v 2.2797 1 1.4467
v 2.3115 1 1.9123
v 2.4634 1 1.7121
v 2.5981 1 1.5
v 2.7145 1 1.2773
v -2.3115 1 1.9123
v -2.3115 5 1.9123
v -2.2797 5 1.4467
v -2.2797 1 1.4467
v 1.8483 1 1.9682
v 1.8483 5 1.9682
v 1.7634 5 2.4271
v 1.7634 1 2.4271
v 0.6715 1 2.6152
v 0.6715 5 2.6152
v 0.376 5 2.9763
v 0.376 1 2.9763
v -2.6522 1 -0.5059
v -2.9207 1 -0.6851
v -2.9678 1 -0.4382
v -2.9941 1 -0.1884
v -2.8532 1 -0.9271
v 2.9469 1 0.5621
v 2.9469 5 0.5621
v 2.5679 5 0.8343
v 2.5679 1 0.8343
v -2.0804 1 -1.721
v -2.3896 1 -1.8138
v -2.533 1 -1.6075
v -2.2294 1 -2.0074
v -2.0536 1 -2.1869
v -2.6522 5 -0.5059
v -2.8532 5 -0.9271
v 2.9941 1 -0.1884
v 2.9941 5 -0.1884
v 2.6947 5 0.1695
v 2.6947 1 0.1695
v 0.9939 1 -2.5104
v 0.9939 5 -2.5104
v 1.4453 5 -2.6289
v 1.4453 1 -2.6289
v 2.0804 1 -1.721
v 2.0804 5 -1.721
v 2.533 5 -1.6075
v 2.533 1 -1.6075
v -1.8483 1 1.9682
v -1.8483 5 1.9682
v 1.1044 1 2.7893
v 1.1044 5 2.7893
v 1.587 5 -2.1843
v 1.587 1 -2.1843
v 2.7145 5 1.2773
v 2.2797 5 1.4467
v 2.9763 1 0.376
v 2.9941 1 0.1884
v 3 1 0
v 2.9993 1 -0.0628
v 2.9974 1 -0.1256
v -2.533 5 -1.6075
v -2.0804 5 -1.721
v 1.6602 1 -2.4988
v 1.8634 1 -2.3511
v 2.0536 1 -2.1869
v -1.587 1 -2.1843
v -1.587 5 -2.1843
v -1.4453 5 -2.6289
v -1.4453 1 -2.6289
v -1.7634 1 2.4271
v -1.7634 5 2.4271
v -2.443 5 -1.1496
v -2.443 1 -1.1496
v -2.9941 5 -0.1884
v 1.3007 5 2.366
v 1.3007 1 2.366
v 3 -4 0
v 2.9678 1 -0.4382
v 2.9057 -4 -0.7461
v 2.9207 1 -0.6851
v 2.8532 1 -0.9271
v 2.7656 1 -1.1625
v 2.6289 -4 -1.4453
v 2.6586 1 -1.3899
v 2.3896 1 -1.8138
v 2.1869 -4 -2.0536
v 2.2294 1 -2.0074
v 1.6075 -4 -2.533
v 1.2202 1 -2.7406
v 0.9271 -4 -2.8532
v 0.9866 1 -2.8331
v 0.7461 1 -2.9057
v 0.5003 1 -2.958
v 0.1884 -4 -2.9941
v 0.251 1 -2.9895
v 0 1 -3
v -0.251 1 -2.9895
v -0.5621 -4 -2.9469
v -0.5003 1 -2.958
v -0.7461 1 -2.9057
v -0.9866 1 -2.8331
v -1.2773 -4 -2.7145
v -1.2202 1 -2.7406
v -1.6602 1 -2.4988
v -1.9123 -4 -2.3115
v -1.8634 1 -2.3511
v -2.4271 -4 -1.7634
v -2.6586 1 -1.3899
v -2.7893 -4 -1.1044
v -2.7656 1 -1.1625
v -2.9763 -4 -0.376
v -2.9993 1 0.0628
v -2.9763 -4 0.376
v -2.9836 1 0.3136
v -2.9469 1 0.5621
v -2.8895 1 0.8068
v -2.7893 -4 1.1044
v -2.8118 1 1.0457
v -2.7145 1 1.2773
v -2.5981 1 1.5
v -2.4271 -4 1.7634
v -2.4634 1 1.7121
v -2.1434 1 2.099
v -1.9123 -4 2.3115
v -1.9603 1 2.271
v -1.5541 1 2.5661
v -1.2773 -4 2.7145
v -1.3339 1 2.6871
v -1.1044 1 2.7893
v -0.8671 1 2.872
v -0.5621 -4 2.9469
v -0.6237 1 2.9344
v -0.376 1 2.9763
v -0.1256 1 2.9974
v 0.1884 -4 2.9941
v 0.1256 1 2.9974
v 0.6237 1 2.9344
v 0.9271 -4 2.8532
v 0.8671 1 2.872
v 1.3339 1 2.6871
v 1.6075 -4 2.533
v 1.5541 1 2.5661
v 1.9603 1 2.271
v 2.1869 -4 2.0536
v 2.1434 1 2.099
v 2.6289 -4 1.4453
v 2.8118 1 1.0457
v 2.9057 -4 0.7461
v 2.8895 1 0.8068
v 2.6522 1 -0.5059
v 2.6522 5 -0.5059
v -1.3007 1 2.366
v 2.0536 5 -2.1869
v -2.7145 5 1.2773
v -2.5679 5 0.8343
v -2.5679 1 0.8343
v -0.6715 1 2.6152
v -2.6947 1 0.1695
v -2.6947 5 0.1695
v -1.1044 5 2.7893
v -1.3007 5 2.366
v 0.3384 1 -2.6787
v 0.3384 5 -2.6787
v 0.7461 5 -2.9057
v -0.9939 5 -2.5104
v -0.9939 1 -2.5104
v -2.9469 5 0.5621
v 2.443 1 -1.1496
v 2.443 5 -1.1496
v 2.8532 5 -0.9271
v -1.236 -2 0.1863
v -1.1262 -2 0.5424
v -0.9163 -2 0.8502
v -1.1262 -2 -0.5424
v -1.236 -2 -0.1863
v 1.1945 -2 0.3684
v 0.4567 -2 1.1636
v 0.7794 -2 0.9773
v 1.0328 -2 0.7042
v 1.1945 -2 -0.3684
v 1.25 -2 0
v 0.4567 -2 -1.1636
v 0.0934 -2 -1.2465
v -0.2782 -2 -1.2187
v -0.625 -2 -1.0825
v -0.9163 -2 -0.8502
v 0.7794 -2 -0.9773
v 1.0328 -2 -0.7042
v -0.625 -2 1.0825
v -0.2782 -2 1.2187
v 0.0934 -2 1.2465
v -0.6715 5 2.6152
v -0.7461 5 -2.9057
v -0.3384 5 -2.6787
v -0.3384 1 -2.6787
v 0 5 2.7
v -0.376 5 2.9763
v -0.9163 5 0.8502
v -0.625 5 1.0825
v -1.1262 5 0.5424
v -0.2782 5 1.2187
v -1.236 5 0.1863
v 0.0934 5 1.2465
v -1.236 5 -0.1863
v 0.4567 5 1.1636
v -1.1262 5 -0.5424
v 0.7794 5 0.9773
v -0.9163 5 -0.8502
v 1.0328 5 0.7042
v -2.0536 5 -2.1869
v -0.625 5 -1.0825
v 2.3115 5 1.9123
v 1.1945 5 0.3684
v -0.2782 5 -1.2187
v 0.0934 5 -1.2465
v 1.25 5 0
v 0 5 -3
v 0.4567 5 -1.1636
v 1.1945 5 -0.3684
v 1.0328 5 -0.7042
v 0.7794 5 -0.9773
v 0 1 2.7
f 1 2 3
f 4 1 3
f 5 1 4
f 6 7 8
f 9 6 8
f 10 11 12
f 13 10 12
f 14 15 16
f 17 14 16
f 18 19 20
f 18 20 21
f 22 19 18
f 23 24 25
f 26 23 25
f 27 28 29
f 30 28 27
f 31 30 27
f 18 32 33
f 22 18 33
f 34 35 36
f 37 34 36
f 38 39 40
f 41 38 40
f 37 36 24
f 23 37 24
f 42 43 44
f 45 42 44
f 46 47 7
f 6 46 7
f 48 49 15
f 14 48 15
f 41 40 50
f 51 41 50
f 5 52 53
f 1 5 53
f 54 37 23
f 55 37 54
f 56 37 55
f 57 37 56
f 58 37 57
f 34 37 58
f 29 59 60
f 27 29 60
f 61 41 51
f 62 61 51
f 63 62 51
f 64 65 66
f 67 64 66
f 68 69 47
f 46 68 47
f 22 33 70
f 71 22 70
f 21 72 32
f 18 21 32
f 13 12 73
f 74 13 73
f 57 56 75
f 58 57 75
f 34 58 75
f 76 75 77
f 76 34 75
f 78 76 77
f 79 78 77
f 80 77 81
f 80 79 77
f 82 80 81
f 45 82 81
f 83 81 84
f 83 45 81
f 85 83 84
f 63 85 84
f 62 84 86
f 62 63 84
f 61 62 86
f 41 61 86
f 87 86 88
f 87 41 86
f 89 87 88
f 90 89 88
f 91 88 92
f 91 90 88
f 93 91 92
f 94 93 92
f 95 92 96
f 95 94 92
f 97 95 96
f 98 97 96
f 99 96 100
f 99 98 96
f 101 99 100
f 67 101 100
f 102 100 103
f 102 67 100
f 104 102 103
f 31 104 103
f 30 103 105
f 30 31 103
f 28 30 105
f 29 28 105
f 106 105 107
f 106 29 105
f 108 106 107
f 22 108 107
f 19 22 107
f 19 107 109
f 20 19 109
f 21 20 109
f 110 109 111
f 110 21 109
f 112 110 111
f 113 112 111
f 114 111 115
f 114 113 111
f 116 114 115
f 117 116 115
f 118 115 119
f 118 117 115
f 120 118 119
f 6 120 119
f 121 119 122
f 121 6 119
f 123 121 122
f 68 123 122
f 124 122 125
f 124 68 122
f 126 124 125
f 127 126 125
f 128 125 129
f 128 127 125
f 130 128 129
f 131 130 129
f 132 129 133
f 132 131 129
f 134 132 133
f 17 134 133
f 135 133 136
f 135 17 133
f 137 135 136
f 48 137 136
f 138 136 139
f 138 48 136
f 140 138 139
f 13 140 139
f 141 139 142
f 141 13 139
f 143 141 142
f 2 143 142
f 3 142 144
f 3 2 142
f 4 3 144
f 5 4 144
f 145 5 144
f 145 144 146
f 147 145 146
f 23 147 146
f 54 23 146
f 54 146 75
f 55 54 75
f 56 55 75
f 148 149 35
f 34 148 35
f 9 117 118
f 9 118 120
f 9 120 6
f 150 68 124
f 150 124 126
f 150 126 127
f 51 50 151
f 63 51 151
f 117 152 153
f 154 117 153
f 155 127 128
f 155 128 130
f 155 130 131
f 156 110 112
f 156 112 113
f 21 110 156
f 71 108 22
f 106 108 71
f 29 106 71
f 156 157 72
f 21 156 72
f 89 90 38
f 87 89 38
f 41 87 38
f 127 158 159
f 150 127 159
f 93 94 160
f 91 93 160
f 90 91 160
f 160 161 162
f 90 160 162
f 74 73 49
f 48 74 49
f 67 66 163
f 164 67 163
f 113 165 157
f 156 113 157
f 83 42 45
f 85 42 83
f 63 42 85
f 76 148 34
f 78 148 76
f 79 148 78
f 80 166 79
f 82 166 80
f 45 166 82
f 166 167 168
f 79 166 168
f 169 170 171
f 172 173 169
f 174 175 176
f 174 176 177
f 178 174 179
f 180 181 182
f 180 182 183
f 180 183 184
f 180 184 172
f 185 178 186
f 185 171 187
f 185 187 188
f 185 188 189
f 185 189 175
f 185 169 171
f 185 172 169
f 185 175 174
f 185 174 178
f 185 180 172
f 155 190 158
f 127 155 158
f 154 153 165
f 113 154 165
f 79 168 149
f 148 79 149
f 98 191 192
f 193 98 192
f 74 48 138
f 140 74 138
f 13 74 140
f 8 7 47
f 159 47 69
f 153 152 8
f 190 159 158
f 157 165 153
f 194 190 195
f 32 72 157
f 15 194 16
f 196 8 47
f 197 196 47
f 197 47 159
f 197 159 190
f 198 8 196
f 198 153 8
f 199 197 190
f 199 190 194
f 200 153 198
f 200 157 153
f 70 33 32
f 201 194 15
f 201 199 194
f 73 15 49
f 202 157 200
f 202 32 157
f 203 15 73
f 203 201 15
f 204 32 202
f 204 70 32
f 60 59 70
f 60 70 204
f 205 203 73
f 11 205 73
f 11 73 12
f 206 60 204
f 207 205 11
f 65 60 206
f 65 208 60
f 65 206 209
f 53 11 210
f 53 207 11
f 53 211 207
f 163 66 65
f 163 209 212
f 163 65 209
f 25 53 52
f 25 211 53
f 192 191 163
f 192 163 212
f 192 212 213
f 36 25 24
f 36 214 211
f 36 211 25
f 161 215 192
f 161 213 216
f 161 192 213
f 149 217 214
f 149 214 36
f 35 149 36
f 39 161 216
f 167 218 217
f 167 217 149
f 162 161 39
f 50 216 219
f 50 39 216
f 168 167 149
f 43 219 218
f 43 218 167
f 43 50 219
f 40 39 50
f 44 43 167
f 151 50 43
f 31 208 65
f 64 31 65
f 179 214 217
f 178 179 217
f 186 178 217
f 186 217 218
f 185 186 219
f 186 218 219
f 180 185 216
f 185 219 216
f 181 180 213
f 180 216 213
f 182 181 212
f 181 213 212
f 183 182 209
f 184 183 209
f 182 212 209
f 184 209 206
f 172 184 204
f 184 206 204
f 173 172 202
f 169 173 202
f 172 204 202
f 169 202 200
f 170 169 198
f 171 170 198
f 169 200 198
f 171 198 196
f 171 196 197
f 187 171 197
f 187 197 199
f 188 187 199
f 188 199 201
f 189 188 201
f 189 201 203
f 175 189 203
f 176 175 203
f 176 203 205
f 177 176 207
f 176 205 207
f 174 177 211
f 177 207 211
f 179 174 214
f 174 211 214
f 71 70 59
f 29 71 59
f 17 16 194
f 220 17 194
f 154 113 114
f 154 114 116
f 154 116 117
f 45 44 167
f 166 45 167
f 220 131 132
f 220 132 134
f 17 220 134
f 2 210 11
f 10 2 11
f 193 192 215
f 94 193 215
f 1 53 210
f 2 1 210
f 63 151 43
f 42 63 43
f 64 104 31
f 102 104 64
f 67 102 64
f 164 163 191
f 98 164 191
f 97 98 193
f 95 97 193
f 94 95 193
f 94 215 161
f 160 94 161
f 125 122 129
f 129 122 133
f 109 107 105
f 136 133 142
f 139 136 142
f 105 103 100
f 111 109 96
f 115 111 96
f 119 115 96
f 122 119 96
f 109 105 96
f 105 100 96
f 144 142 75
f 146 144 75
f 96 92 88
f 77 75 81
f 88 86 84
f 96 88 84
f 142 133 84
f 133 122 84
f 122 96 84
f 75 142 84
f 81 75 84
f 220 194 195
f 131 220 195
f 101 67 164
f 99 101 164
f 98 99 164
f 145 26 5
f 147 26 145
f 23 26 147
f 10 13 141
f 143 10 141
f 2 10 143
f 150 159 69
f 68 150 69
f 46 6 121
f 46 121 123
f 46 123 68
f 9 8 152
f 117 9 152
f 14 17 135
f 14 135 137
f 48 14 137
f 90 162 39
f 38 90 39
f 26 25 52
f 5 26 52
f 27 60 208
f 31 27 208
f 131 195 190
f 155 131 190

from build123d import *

# Parameters (mm, degrees)
SKETCH_1_R           = 3
EXTRUDE_1_DEPTH      = 5
EXTRUDE_1_DEPTH_BACK = 4
SKETCH_2_OUTSIDE_W   = 10.474
SKETCH_2_OUTSIDE_H   = 10.474
CUT_EXTRUDE_1_DEPTH  = 4
SKETCH_3_R           = 1.25
CUT_EXTRUDE_2_DEPTH  = 7


with BuildPart() as part:
    # Эскиз1 → Бобышка-Вытянуть1 (new body, two sides)
    with BuildSketch(Plane(origin=(0, 0, 0), x_dir=(1, 0, 0), z_dir=(0, 1, 0))) as extrude_1_sk:
        Circle(SKETCH_1_R)
    extrude(amount=EXTRUDE_1_DEPTH)
    extrude(extrude_1_sk.sketch, amount=-EXTRUDE_1_DEPTH_BACK)

    # Эскиз2 outside → Вырез-Вытянуть1 (cut)
    with BuildSketch(Plane(origin=(0, 5, 0), x_dir=(1, 0, 0), z_dir=(0, 1, 0))):
        Rectangle(SKETCH_2_OUTSIDE_W, SKETCH_2_OUTSIDE_H)
        Polygon((0, 3), (0.338399731, 2.678709694), (0.746069661, 2.905749483), (0.993936292, 2.510396512), (1.445261022, 2.62892004), (1.587020181, 2.184345885), (2.053641318, 2.186905882), (2.080385755, 1.721044772), (2.532983777, 1.607480385), (2.443033042, 1.149604087), (2.853169549, 0.927050983), (2.652175577, 0.505929549), (2.994080185, 0.188371559), (2.694672167, -0.169534403), (2.946861752, -0.562143944), (2.567852594, -0.834345885), (2.714481157, -1.277337875), (2.279685399, -1.446732346), (2.311539728, -1.912271969), (1.848277186, -1.968215294), (1.763355757, -2.427050983), (1.30073492, -2.366028036), (1.104373658, -2.789329458), (0.671462695, -2.615174535), (0.375999701, -2.976344104), (0, -2.7), (-0.375999701, -2.976344104), (-0.671462695, -2.615174535), (-1.104373658, -2.789329458), (-1.30073492, -2.366028036), (-1.763355757, -2.427050983), (-1.848277186, -1.968215294), (-2.311539728, -1.912271969), (-2.279685399, -1.446732346), (-2.714481157, -1.277337875), (-2.567852594, -0.834345885), (-2.946861752, -0.562143944), (-2.694672167, -0.169534403), (-2.994080185, 0.188371559), (-2.652175577, 0.505929549), (-2.853169549, 0.927050983), (-2.443033042, 1.149604087), (-2.532983777, 1.607480385), (-2.080385755, 1.721044772), (-2.053641318, 2.186905882), (-1.587020181, 2.184345885), (-1.445261022, 2.62892004), (-0.993936292, 2.510396512), (-0.746069661, 2.905749483), (-0.338399731, 2.678709694), align=None, mode=Mode.SUBTRACT)
    extrude(amount=-CUT_EXTRUDE_1_DEPTH, mode=Mode.SUBTRACT)

    # Эскиз3 → Вырез-Вытянуть2 (cut)
    with BuildSketch(Plane(origin=(0, 5, 0), x_dir=(1, 0, 0), z_dir=(0, 1, 0))):
        Circle(SKETCH_3_R)
    extrude(amount=-CUT_EXTRUDE_2_DEPTH, mode=Mode.SUBTRACT)


solid = part.part
